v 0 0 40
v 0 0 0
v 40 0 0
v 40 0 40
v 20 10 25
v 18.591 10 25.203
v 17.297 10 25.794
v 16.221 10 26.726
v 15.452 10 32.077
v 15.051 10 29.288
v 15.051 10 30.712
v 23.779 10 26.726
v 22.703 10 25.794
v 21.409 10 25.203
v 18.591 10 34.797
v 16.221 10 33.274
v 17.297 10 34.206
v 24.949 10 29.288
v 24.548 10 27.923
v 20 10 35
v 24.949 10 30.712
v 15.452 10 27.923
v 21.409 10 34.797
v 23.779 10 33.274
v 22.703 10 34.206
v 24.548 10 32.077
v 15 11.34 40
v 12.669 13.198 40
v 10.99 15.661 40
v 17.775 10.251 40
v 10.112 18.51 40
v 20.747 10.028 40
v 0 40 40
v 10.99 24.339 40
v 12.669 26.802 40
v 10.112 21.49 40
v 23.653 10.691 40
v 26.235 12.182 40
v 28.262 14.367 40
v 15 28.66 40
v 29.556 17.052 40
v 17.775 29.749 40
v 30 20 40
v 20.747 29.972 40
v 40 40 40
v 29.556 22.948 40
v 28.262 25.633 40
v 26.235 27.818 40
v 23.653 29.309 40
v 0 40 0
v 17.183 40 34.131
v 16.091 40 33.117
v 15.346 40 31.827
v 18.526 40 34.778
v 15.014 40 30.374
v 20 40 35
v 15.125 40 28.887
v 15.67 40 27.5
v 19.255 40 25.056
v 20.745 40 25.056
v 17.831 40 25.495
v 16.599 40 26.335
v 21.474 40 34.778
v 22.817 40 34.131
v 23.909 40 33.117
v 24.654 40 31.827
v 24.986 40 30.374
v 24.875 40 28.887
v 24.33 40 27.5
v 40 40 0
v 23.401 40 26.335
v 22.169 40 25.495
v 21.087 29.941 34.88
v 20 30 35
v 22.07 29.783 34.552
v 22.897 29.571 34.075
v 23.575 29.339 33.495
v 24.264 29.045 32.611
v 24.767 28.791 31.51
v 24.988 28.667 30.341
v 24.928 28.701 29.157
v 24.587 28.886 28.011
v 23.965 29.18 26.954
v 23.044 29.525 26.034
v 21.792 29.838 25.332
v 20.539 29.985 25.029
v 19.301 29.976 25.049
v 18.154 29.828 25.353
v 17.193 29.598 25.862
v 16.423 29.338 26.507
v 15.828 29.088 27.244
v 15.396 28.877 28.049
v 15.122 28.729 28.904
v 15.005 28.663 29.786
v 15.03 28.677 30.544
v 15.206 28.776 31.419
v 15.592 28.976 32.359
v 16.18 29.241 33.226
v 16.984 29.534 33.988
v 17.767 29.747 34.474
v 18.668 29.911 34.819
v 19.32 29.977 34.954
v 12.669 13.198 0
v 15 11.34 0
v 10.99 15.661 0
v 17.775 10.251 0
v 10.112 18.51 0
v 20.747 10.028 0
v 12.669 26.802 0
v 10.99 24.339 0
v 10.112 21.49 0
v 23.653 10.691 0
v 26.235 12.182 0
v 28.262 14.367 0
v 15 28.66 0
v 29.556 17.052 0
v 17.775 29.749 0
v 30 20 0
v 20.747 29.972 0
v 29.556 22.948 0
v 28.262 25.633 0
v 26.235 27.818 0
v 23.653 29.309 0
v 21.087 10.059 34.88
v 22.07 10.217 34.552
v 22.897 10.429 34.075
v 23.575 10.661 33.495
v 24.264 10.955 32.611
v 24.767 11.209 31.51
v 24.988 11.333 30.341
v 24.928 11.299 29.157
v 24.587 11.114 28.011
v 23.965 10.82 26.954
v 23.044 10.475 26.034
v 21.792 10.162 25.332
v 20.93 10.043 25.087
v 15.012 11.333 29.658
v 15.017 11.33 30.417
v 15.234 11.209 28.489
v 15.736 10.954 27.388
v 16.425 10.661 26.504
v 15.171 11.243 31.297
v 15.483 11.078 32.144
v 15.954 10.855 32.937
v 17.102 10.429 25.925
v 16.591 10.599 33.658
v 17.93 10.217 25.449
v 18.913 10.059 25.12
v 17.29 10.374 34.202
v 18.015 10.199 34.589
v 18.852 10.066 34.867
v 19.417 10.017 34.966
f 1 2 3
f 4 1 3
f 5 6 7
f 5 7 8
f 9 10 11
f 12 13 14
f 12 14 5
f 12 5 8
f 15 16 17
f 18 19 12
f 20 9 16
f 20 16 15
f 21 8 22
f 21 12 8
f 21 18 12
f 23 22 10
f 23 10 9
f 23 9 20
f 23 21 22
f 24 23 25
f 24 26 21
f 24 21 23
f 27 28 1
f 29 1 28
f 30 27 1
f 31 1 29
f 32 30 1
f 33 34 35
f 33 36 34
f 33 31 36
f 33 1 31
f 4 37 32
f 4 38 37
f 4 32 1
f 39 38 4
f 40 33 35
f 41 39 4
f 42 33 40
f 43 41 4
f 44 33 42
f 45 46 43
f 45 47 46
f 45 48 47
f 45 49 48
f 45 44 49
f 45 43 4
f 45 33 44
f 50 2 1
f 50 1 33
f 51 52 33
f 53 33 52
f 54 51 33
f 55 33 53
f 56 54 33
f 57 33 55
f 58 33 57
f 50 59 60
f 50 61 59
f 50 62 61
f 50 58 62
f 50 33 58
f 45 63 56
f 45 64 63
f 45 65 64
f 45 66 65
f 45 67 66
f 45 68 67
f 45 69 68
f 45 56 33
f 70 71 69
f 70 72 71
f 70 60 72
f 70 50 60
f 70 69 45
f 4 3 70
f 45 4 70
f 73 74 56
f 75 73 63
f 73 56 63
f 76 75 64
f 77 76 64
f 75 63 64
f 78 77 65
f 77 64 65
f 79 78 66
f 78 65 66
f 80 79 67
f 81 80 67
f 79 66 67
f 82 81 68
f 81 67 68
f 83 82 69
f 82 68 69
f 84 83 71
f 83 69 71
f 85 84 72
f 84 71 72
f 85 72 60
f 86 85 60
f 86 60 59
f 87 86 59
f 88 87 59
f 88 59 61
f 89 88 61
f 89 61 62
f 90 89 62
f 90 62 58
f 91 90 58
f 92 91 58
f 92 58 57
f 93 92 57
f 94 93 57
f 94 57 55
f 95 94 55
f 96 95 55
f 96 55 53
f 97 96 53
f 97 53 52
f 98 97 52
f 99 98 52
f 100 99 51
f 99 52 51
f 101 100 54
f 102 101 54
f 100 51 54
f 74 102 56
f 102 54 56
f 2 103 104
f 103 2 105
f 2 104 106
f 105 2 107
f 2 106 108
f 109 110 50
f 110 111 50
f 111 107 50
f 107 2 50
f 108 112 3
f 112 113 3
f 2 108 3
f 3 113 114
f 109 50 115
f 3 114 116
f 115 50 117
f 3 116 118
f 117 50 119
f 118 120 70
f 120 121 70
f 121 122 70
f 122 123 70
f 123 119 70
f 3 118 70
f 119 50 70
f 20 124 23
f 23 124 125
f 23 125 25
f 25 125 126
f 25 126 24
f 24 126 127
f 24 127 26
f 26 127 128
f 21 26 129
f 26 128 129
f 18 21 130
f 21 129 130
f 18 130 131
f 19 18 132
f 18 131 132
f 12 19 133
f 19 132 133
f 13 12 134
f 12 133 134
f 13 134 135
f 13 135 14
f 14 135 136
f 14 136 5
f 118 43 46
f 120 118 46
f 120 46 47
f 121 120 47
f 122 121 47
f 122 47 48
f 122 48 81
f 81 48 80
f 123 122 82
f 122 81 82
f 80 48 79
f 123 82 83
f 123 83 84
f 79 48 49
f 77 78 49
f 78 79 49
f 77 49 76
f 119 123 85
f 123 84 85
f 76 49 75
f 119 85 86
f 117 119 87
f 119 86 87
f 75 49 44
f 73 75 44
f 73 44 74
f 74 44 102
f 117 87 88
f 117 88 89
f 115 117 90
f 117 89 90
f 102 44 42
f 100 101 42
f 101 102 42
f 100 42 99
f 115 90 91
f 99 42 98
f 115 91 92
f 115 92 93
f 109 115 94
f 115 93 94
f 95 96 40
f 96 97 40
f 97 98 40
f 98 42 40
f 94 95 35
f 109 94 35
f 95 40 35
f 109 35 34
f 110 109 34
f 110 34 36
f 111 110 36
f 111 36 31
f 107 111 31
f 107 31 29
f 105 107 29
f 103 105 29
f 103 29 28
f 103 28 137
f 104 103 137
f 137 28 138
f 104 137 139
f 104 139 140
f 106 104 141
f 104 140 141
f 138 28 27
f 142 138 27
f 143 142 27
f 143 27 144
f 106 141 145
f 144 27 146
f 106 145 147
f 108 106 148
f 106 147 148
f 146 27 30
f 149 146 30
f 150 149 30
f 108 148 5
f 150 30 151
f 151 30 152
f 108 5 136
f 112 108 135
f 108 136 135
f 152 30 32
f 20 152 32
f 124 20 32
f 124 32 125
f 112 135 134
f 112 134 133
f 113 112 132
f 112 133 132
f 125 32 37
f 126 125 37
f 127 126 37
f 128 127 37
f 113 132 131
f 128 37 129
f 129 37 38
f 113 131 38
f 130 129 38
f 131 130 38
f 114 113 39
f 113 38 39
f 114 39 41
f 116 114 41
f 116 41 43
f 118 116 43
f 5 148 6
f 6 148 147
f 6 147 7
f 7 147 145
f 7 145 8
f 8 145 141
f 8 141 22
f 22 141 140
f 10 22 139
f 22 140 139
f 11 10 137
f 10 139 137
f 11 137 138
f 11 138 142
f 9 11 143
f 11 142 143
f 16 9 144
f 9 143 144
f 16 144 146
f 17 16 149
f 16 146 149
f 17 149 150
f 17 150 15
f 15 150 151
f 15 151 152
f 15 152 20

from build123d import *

# Parameters (mm, degrees)
ESQUISSE1_W             = 40
ESQUISSE1_H             = 40
BOSS_EXTRU_1_DEPTH      = 40
ESQUISSE2_R             = 10
ENL_V_MAT_EXTRU_1_DEPTH = 40
ESQUISSE3_R             = 5
ENL_V_MAT_EXTRU_2_DEPTH = 30


with BuildPart() as part:
    # Esquisse1 → Boss.-Extru.1 (new body)
    with BuildSketch(Plane.XY):
        with Locations((20, 20)):
            Rectangle(ESQUISSE1_W, ESQUISSE1_H)
    extrude(amount=BOSS_EXTRU_1_DEPTH)

    # Esquisse2 → Enlèv. mat.-Extru.1 (cut)
    with BuildSketch(Plane.XY.offset(40)):
        with Locations((20, 20)):
            Circle(ESQUISSE2_R)
    extrude(amount=-ENL_V_MAT_EXTRU_1_DEPTH, mode=Mode.SUBTRACT)

    # Esquisse3 → Enlèv. mat.-Extru.2 (cut)
    with BuildSketch(Plane(origin=(0, 40, 0), x_dir=(1, 0, 0), z_dir=(0, 1, 0))):
        with Locations(Location((20, -30, 0), (0, 0, 270))):
            Circle(ESQUISSE3_R)
    extrude(amount=-ENL_V_MAT_EXTRU_2_DEPTH, mode=Mode.SUBTRACT)


solid = part.part
